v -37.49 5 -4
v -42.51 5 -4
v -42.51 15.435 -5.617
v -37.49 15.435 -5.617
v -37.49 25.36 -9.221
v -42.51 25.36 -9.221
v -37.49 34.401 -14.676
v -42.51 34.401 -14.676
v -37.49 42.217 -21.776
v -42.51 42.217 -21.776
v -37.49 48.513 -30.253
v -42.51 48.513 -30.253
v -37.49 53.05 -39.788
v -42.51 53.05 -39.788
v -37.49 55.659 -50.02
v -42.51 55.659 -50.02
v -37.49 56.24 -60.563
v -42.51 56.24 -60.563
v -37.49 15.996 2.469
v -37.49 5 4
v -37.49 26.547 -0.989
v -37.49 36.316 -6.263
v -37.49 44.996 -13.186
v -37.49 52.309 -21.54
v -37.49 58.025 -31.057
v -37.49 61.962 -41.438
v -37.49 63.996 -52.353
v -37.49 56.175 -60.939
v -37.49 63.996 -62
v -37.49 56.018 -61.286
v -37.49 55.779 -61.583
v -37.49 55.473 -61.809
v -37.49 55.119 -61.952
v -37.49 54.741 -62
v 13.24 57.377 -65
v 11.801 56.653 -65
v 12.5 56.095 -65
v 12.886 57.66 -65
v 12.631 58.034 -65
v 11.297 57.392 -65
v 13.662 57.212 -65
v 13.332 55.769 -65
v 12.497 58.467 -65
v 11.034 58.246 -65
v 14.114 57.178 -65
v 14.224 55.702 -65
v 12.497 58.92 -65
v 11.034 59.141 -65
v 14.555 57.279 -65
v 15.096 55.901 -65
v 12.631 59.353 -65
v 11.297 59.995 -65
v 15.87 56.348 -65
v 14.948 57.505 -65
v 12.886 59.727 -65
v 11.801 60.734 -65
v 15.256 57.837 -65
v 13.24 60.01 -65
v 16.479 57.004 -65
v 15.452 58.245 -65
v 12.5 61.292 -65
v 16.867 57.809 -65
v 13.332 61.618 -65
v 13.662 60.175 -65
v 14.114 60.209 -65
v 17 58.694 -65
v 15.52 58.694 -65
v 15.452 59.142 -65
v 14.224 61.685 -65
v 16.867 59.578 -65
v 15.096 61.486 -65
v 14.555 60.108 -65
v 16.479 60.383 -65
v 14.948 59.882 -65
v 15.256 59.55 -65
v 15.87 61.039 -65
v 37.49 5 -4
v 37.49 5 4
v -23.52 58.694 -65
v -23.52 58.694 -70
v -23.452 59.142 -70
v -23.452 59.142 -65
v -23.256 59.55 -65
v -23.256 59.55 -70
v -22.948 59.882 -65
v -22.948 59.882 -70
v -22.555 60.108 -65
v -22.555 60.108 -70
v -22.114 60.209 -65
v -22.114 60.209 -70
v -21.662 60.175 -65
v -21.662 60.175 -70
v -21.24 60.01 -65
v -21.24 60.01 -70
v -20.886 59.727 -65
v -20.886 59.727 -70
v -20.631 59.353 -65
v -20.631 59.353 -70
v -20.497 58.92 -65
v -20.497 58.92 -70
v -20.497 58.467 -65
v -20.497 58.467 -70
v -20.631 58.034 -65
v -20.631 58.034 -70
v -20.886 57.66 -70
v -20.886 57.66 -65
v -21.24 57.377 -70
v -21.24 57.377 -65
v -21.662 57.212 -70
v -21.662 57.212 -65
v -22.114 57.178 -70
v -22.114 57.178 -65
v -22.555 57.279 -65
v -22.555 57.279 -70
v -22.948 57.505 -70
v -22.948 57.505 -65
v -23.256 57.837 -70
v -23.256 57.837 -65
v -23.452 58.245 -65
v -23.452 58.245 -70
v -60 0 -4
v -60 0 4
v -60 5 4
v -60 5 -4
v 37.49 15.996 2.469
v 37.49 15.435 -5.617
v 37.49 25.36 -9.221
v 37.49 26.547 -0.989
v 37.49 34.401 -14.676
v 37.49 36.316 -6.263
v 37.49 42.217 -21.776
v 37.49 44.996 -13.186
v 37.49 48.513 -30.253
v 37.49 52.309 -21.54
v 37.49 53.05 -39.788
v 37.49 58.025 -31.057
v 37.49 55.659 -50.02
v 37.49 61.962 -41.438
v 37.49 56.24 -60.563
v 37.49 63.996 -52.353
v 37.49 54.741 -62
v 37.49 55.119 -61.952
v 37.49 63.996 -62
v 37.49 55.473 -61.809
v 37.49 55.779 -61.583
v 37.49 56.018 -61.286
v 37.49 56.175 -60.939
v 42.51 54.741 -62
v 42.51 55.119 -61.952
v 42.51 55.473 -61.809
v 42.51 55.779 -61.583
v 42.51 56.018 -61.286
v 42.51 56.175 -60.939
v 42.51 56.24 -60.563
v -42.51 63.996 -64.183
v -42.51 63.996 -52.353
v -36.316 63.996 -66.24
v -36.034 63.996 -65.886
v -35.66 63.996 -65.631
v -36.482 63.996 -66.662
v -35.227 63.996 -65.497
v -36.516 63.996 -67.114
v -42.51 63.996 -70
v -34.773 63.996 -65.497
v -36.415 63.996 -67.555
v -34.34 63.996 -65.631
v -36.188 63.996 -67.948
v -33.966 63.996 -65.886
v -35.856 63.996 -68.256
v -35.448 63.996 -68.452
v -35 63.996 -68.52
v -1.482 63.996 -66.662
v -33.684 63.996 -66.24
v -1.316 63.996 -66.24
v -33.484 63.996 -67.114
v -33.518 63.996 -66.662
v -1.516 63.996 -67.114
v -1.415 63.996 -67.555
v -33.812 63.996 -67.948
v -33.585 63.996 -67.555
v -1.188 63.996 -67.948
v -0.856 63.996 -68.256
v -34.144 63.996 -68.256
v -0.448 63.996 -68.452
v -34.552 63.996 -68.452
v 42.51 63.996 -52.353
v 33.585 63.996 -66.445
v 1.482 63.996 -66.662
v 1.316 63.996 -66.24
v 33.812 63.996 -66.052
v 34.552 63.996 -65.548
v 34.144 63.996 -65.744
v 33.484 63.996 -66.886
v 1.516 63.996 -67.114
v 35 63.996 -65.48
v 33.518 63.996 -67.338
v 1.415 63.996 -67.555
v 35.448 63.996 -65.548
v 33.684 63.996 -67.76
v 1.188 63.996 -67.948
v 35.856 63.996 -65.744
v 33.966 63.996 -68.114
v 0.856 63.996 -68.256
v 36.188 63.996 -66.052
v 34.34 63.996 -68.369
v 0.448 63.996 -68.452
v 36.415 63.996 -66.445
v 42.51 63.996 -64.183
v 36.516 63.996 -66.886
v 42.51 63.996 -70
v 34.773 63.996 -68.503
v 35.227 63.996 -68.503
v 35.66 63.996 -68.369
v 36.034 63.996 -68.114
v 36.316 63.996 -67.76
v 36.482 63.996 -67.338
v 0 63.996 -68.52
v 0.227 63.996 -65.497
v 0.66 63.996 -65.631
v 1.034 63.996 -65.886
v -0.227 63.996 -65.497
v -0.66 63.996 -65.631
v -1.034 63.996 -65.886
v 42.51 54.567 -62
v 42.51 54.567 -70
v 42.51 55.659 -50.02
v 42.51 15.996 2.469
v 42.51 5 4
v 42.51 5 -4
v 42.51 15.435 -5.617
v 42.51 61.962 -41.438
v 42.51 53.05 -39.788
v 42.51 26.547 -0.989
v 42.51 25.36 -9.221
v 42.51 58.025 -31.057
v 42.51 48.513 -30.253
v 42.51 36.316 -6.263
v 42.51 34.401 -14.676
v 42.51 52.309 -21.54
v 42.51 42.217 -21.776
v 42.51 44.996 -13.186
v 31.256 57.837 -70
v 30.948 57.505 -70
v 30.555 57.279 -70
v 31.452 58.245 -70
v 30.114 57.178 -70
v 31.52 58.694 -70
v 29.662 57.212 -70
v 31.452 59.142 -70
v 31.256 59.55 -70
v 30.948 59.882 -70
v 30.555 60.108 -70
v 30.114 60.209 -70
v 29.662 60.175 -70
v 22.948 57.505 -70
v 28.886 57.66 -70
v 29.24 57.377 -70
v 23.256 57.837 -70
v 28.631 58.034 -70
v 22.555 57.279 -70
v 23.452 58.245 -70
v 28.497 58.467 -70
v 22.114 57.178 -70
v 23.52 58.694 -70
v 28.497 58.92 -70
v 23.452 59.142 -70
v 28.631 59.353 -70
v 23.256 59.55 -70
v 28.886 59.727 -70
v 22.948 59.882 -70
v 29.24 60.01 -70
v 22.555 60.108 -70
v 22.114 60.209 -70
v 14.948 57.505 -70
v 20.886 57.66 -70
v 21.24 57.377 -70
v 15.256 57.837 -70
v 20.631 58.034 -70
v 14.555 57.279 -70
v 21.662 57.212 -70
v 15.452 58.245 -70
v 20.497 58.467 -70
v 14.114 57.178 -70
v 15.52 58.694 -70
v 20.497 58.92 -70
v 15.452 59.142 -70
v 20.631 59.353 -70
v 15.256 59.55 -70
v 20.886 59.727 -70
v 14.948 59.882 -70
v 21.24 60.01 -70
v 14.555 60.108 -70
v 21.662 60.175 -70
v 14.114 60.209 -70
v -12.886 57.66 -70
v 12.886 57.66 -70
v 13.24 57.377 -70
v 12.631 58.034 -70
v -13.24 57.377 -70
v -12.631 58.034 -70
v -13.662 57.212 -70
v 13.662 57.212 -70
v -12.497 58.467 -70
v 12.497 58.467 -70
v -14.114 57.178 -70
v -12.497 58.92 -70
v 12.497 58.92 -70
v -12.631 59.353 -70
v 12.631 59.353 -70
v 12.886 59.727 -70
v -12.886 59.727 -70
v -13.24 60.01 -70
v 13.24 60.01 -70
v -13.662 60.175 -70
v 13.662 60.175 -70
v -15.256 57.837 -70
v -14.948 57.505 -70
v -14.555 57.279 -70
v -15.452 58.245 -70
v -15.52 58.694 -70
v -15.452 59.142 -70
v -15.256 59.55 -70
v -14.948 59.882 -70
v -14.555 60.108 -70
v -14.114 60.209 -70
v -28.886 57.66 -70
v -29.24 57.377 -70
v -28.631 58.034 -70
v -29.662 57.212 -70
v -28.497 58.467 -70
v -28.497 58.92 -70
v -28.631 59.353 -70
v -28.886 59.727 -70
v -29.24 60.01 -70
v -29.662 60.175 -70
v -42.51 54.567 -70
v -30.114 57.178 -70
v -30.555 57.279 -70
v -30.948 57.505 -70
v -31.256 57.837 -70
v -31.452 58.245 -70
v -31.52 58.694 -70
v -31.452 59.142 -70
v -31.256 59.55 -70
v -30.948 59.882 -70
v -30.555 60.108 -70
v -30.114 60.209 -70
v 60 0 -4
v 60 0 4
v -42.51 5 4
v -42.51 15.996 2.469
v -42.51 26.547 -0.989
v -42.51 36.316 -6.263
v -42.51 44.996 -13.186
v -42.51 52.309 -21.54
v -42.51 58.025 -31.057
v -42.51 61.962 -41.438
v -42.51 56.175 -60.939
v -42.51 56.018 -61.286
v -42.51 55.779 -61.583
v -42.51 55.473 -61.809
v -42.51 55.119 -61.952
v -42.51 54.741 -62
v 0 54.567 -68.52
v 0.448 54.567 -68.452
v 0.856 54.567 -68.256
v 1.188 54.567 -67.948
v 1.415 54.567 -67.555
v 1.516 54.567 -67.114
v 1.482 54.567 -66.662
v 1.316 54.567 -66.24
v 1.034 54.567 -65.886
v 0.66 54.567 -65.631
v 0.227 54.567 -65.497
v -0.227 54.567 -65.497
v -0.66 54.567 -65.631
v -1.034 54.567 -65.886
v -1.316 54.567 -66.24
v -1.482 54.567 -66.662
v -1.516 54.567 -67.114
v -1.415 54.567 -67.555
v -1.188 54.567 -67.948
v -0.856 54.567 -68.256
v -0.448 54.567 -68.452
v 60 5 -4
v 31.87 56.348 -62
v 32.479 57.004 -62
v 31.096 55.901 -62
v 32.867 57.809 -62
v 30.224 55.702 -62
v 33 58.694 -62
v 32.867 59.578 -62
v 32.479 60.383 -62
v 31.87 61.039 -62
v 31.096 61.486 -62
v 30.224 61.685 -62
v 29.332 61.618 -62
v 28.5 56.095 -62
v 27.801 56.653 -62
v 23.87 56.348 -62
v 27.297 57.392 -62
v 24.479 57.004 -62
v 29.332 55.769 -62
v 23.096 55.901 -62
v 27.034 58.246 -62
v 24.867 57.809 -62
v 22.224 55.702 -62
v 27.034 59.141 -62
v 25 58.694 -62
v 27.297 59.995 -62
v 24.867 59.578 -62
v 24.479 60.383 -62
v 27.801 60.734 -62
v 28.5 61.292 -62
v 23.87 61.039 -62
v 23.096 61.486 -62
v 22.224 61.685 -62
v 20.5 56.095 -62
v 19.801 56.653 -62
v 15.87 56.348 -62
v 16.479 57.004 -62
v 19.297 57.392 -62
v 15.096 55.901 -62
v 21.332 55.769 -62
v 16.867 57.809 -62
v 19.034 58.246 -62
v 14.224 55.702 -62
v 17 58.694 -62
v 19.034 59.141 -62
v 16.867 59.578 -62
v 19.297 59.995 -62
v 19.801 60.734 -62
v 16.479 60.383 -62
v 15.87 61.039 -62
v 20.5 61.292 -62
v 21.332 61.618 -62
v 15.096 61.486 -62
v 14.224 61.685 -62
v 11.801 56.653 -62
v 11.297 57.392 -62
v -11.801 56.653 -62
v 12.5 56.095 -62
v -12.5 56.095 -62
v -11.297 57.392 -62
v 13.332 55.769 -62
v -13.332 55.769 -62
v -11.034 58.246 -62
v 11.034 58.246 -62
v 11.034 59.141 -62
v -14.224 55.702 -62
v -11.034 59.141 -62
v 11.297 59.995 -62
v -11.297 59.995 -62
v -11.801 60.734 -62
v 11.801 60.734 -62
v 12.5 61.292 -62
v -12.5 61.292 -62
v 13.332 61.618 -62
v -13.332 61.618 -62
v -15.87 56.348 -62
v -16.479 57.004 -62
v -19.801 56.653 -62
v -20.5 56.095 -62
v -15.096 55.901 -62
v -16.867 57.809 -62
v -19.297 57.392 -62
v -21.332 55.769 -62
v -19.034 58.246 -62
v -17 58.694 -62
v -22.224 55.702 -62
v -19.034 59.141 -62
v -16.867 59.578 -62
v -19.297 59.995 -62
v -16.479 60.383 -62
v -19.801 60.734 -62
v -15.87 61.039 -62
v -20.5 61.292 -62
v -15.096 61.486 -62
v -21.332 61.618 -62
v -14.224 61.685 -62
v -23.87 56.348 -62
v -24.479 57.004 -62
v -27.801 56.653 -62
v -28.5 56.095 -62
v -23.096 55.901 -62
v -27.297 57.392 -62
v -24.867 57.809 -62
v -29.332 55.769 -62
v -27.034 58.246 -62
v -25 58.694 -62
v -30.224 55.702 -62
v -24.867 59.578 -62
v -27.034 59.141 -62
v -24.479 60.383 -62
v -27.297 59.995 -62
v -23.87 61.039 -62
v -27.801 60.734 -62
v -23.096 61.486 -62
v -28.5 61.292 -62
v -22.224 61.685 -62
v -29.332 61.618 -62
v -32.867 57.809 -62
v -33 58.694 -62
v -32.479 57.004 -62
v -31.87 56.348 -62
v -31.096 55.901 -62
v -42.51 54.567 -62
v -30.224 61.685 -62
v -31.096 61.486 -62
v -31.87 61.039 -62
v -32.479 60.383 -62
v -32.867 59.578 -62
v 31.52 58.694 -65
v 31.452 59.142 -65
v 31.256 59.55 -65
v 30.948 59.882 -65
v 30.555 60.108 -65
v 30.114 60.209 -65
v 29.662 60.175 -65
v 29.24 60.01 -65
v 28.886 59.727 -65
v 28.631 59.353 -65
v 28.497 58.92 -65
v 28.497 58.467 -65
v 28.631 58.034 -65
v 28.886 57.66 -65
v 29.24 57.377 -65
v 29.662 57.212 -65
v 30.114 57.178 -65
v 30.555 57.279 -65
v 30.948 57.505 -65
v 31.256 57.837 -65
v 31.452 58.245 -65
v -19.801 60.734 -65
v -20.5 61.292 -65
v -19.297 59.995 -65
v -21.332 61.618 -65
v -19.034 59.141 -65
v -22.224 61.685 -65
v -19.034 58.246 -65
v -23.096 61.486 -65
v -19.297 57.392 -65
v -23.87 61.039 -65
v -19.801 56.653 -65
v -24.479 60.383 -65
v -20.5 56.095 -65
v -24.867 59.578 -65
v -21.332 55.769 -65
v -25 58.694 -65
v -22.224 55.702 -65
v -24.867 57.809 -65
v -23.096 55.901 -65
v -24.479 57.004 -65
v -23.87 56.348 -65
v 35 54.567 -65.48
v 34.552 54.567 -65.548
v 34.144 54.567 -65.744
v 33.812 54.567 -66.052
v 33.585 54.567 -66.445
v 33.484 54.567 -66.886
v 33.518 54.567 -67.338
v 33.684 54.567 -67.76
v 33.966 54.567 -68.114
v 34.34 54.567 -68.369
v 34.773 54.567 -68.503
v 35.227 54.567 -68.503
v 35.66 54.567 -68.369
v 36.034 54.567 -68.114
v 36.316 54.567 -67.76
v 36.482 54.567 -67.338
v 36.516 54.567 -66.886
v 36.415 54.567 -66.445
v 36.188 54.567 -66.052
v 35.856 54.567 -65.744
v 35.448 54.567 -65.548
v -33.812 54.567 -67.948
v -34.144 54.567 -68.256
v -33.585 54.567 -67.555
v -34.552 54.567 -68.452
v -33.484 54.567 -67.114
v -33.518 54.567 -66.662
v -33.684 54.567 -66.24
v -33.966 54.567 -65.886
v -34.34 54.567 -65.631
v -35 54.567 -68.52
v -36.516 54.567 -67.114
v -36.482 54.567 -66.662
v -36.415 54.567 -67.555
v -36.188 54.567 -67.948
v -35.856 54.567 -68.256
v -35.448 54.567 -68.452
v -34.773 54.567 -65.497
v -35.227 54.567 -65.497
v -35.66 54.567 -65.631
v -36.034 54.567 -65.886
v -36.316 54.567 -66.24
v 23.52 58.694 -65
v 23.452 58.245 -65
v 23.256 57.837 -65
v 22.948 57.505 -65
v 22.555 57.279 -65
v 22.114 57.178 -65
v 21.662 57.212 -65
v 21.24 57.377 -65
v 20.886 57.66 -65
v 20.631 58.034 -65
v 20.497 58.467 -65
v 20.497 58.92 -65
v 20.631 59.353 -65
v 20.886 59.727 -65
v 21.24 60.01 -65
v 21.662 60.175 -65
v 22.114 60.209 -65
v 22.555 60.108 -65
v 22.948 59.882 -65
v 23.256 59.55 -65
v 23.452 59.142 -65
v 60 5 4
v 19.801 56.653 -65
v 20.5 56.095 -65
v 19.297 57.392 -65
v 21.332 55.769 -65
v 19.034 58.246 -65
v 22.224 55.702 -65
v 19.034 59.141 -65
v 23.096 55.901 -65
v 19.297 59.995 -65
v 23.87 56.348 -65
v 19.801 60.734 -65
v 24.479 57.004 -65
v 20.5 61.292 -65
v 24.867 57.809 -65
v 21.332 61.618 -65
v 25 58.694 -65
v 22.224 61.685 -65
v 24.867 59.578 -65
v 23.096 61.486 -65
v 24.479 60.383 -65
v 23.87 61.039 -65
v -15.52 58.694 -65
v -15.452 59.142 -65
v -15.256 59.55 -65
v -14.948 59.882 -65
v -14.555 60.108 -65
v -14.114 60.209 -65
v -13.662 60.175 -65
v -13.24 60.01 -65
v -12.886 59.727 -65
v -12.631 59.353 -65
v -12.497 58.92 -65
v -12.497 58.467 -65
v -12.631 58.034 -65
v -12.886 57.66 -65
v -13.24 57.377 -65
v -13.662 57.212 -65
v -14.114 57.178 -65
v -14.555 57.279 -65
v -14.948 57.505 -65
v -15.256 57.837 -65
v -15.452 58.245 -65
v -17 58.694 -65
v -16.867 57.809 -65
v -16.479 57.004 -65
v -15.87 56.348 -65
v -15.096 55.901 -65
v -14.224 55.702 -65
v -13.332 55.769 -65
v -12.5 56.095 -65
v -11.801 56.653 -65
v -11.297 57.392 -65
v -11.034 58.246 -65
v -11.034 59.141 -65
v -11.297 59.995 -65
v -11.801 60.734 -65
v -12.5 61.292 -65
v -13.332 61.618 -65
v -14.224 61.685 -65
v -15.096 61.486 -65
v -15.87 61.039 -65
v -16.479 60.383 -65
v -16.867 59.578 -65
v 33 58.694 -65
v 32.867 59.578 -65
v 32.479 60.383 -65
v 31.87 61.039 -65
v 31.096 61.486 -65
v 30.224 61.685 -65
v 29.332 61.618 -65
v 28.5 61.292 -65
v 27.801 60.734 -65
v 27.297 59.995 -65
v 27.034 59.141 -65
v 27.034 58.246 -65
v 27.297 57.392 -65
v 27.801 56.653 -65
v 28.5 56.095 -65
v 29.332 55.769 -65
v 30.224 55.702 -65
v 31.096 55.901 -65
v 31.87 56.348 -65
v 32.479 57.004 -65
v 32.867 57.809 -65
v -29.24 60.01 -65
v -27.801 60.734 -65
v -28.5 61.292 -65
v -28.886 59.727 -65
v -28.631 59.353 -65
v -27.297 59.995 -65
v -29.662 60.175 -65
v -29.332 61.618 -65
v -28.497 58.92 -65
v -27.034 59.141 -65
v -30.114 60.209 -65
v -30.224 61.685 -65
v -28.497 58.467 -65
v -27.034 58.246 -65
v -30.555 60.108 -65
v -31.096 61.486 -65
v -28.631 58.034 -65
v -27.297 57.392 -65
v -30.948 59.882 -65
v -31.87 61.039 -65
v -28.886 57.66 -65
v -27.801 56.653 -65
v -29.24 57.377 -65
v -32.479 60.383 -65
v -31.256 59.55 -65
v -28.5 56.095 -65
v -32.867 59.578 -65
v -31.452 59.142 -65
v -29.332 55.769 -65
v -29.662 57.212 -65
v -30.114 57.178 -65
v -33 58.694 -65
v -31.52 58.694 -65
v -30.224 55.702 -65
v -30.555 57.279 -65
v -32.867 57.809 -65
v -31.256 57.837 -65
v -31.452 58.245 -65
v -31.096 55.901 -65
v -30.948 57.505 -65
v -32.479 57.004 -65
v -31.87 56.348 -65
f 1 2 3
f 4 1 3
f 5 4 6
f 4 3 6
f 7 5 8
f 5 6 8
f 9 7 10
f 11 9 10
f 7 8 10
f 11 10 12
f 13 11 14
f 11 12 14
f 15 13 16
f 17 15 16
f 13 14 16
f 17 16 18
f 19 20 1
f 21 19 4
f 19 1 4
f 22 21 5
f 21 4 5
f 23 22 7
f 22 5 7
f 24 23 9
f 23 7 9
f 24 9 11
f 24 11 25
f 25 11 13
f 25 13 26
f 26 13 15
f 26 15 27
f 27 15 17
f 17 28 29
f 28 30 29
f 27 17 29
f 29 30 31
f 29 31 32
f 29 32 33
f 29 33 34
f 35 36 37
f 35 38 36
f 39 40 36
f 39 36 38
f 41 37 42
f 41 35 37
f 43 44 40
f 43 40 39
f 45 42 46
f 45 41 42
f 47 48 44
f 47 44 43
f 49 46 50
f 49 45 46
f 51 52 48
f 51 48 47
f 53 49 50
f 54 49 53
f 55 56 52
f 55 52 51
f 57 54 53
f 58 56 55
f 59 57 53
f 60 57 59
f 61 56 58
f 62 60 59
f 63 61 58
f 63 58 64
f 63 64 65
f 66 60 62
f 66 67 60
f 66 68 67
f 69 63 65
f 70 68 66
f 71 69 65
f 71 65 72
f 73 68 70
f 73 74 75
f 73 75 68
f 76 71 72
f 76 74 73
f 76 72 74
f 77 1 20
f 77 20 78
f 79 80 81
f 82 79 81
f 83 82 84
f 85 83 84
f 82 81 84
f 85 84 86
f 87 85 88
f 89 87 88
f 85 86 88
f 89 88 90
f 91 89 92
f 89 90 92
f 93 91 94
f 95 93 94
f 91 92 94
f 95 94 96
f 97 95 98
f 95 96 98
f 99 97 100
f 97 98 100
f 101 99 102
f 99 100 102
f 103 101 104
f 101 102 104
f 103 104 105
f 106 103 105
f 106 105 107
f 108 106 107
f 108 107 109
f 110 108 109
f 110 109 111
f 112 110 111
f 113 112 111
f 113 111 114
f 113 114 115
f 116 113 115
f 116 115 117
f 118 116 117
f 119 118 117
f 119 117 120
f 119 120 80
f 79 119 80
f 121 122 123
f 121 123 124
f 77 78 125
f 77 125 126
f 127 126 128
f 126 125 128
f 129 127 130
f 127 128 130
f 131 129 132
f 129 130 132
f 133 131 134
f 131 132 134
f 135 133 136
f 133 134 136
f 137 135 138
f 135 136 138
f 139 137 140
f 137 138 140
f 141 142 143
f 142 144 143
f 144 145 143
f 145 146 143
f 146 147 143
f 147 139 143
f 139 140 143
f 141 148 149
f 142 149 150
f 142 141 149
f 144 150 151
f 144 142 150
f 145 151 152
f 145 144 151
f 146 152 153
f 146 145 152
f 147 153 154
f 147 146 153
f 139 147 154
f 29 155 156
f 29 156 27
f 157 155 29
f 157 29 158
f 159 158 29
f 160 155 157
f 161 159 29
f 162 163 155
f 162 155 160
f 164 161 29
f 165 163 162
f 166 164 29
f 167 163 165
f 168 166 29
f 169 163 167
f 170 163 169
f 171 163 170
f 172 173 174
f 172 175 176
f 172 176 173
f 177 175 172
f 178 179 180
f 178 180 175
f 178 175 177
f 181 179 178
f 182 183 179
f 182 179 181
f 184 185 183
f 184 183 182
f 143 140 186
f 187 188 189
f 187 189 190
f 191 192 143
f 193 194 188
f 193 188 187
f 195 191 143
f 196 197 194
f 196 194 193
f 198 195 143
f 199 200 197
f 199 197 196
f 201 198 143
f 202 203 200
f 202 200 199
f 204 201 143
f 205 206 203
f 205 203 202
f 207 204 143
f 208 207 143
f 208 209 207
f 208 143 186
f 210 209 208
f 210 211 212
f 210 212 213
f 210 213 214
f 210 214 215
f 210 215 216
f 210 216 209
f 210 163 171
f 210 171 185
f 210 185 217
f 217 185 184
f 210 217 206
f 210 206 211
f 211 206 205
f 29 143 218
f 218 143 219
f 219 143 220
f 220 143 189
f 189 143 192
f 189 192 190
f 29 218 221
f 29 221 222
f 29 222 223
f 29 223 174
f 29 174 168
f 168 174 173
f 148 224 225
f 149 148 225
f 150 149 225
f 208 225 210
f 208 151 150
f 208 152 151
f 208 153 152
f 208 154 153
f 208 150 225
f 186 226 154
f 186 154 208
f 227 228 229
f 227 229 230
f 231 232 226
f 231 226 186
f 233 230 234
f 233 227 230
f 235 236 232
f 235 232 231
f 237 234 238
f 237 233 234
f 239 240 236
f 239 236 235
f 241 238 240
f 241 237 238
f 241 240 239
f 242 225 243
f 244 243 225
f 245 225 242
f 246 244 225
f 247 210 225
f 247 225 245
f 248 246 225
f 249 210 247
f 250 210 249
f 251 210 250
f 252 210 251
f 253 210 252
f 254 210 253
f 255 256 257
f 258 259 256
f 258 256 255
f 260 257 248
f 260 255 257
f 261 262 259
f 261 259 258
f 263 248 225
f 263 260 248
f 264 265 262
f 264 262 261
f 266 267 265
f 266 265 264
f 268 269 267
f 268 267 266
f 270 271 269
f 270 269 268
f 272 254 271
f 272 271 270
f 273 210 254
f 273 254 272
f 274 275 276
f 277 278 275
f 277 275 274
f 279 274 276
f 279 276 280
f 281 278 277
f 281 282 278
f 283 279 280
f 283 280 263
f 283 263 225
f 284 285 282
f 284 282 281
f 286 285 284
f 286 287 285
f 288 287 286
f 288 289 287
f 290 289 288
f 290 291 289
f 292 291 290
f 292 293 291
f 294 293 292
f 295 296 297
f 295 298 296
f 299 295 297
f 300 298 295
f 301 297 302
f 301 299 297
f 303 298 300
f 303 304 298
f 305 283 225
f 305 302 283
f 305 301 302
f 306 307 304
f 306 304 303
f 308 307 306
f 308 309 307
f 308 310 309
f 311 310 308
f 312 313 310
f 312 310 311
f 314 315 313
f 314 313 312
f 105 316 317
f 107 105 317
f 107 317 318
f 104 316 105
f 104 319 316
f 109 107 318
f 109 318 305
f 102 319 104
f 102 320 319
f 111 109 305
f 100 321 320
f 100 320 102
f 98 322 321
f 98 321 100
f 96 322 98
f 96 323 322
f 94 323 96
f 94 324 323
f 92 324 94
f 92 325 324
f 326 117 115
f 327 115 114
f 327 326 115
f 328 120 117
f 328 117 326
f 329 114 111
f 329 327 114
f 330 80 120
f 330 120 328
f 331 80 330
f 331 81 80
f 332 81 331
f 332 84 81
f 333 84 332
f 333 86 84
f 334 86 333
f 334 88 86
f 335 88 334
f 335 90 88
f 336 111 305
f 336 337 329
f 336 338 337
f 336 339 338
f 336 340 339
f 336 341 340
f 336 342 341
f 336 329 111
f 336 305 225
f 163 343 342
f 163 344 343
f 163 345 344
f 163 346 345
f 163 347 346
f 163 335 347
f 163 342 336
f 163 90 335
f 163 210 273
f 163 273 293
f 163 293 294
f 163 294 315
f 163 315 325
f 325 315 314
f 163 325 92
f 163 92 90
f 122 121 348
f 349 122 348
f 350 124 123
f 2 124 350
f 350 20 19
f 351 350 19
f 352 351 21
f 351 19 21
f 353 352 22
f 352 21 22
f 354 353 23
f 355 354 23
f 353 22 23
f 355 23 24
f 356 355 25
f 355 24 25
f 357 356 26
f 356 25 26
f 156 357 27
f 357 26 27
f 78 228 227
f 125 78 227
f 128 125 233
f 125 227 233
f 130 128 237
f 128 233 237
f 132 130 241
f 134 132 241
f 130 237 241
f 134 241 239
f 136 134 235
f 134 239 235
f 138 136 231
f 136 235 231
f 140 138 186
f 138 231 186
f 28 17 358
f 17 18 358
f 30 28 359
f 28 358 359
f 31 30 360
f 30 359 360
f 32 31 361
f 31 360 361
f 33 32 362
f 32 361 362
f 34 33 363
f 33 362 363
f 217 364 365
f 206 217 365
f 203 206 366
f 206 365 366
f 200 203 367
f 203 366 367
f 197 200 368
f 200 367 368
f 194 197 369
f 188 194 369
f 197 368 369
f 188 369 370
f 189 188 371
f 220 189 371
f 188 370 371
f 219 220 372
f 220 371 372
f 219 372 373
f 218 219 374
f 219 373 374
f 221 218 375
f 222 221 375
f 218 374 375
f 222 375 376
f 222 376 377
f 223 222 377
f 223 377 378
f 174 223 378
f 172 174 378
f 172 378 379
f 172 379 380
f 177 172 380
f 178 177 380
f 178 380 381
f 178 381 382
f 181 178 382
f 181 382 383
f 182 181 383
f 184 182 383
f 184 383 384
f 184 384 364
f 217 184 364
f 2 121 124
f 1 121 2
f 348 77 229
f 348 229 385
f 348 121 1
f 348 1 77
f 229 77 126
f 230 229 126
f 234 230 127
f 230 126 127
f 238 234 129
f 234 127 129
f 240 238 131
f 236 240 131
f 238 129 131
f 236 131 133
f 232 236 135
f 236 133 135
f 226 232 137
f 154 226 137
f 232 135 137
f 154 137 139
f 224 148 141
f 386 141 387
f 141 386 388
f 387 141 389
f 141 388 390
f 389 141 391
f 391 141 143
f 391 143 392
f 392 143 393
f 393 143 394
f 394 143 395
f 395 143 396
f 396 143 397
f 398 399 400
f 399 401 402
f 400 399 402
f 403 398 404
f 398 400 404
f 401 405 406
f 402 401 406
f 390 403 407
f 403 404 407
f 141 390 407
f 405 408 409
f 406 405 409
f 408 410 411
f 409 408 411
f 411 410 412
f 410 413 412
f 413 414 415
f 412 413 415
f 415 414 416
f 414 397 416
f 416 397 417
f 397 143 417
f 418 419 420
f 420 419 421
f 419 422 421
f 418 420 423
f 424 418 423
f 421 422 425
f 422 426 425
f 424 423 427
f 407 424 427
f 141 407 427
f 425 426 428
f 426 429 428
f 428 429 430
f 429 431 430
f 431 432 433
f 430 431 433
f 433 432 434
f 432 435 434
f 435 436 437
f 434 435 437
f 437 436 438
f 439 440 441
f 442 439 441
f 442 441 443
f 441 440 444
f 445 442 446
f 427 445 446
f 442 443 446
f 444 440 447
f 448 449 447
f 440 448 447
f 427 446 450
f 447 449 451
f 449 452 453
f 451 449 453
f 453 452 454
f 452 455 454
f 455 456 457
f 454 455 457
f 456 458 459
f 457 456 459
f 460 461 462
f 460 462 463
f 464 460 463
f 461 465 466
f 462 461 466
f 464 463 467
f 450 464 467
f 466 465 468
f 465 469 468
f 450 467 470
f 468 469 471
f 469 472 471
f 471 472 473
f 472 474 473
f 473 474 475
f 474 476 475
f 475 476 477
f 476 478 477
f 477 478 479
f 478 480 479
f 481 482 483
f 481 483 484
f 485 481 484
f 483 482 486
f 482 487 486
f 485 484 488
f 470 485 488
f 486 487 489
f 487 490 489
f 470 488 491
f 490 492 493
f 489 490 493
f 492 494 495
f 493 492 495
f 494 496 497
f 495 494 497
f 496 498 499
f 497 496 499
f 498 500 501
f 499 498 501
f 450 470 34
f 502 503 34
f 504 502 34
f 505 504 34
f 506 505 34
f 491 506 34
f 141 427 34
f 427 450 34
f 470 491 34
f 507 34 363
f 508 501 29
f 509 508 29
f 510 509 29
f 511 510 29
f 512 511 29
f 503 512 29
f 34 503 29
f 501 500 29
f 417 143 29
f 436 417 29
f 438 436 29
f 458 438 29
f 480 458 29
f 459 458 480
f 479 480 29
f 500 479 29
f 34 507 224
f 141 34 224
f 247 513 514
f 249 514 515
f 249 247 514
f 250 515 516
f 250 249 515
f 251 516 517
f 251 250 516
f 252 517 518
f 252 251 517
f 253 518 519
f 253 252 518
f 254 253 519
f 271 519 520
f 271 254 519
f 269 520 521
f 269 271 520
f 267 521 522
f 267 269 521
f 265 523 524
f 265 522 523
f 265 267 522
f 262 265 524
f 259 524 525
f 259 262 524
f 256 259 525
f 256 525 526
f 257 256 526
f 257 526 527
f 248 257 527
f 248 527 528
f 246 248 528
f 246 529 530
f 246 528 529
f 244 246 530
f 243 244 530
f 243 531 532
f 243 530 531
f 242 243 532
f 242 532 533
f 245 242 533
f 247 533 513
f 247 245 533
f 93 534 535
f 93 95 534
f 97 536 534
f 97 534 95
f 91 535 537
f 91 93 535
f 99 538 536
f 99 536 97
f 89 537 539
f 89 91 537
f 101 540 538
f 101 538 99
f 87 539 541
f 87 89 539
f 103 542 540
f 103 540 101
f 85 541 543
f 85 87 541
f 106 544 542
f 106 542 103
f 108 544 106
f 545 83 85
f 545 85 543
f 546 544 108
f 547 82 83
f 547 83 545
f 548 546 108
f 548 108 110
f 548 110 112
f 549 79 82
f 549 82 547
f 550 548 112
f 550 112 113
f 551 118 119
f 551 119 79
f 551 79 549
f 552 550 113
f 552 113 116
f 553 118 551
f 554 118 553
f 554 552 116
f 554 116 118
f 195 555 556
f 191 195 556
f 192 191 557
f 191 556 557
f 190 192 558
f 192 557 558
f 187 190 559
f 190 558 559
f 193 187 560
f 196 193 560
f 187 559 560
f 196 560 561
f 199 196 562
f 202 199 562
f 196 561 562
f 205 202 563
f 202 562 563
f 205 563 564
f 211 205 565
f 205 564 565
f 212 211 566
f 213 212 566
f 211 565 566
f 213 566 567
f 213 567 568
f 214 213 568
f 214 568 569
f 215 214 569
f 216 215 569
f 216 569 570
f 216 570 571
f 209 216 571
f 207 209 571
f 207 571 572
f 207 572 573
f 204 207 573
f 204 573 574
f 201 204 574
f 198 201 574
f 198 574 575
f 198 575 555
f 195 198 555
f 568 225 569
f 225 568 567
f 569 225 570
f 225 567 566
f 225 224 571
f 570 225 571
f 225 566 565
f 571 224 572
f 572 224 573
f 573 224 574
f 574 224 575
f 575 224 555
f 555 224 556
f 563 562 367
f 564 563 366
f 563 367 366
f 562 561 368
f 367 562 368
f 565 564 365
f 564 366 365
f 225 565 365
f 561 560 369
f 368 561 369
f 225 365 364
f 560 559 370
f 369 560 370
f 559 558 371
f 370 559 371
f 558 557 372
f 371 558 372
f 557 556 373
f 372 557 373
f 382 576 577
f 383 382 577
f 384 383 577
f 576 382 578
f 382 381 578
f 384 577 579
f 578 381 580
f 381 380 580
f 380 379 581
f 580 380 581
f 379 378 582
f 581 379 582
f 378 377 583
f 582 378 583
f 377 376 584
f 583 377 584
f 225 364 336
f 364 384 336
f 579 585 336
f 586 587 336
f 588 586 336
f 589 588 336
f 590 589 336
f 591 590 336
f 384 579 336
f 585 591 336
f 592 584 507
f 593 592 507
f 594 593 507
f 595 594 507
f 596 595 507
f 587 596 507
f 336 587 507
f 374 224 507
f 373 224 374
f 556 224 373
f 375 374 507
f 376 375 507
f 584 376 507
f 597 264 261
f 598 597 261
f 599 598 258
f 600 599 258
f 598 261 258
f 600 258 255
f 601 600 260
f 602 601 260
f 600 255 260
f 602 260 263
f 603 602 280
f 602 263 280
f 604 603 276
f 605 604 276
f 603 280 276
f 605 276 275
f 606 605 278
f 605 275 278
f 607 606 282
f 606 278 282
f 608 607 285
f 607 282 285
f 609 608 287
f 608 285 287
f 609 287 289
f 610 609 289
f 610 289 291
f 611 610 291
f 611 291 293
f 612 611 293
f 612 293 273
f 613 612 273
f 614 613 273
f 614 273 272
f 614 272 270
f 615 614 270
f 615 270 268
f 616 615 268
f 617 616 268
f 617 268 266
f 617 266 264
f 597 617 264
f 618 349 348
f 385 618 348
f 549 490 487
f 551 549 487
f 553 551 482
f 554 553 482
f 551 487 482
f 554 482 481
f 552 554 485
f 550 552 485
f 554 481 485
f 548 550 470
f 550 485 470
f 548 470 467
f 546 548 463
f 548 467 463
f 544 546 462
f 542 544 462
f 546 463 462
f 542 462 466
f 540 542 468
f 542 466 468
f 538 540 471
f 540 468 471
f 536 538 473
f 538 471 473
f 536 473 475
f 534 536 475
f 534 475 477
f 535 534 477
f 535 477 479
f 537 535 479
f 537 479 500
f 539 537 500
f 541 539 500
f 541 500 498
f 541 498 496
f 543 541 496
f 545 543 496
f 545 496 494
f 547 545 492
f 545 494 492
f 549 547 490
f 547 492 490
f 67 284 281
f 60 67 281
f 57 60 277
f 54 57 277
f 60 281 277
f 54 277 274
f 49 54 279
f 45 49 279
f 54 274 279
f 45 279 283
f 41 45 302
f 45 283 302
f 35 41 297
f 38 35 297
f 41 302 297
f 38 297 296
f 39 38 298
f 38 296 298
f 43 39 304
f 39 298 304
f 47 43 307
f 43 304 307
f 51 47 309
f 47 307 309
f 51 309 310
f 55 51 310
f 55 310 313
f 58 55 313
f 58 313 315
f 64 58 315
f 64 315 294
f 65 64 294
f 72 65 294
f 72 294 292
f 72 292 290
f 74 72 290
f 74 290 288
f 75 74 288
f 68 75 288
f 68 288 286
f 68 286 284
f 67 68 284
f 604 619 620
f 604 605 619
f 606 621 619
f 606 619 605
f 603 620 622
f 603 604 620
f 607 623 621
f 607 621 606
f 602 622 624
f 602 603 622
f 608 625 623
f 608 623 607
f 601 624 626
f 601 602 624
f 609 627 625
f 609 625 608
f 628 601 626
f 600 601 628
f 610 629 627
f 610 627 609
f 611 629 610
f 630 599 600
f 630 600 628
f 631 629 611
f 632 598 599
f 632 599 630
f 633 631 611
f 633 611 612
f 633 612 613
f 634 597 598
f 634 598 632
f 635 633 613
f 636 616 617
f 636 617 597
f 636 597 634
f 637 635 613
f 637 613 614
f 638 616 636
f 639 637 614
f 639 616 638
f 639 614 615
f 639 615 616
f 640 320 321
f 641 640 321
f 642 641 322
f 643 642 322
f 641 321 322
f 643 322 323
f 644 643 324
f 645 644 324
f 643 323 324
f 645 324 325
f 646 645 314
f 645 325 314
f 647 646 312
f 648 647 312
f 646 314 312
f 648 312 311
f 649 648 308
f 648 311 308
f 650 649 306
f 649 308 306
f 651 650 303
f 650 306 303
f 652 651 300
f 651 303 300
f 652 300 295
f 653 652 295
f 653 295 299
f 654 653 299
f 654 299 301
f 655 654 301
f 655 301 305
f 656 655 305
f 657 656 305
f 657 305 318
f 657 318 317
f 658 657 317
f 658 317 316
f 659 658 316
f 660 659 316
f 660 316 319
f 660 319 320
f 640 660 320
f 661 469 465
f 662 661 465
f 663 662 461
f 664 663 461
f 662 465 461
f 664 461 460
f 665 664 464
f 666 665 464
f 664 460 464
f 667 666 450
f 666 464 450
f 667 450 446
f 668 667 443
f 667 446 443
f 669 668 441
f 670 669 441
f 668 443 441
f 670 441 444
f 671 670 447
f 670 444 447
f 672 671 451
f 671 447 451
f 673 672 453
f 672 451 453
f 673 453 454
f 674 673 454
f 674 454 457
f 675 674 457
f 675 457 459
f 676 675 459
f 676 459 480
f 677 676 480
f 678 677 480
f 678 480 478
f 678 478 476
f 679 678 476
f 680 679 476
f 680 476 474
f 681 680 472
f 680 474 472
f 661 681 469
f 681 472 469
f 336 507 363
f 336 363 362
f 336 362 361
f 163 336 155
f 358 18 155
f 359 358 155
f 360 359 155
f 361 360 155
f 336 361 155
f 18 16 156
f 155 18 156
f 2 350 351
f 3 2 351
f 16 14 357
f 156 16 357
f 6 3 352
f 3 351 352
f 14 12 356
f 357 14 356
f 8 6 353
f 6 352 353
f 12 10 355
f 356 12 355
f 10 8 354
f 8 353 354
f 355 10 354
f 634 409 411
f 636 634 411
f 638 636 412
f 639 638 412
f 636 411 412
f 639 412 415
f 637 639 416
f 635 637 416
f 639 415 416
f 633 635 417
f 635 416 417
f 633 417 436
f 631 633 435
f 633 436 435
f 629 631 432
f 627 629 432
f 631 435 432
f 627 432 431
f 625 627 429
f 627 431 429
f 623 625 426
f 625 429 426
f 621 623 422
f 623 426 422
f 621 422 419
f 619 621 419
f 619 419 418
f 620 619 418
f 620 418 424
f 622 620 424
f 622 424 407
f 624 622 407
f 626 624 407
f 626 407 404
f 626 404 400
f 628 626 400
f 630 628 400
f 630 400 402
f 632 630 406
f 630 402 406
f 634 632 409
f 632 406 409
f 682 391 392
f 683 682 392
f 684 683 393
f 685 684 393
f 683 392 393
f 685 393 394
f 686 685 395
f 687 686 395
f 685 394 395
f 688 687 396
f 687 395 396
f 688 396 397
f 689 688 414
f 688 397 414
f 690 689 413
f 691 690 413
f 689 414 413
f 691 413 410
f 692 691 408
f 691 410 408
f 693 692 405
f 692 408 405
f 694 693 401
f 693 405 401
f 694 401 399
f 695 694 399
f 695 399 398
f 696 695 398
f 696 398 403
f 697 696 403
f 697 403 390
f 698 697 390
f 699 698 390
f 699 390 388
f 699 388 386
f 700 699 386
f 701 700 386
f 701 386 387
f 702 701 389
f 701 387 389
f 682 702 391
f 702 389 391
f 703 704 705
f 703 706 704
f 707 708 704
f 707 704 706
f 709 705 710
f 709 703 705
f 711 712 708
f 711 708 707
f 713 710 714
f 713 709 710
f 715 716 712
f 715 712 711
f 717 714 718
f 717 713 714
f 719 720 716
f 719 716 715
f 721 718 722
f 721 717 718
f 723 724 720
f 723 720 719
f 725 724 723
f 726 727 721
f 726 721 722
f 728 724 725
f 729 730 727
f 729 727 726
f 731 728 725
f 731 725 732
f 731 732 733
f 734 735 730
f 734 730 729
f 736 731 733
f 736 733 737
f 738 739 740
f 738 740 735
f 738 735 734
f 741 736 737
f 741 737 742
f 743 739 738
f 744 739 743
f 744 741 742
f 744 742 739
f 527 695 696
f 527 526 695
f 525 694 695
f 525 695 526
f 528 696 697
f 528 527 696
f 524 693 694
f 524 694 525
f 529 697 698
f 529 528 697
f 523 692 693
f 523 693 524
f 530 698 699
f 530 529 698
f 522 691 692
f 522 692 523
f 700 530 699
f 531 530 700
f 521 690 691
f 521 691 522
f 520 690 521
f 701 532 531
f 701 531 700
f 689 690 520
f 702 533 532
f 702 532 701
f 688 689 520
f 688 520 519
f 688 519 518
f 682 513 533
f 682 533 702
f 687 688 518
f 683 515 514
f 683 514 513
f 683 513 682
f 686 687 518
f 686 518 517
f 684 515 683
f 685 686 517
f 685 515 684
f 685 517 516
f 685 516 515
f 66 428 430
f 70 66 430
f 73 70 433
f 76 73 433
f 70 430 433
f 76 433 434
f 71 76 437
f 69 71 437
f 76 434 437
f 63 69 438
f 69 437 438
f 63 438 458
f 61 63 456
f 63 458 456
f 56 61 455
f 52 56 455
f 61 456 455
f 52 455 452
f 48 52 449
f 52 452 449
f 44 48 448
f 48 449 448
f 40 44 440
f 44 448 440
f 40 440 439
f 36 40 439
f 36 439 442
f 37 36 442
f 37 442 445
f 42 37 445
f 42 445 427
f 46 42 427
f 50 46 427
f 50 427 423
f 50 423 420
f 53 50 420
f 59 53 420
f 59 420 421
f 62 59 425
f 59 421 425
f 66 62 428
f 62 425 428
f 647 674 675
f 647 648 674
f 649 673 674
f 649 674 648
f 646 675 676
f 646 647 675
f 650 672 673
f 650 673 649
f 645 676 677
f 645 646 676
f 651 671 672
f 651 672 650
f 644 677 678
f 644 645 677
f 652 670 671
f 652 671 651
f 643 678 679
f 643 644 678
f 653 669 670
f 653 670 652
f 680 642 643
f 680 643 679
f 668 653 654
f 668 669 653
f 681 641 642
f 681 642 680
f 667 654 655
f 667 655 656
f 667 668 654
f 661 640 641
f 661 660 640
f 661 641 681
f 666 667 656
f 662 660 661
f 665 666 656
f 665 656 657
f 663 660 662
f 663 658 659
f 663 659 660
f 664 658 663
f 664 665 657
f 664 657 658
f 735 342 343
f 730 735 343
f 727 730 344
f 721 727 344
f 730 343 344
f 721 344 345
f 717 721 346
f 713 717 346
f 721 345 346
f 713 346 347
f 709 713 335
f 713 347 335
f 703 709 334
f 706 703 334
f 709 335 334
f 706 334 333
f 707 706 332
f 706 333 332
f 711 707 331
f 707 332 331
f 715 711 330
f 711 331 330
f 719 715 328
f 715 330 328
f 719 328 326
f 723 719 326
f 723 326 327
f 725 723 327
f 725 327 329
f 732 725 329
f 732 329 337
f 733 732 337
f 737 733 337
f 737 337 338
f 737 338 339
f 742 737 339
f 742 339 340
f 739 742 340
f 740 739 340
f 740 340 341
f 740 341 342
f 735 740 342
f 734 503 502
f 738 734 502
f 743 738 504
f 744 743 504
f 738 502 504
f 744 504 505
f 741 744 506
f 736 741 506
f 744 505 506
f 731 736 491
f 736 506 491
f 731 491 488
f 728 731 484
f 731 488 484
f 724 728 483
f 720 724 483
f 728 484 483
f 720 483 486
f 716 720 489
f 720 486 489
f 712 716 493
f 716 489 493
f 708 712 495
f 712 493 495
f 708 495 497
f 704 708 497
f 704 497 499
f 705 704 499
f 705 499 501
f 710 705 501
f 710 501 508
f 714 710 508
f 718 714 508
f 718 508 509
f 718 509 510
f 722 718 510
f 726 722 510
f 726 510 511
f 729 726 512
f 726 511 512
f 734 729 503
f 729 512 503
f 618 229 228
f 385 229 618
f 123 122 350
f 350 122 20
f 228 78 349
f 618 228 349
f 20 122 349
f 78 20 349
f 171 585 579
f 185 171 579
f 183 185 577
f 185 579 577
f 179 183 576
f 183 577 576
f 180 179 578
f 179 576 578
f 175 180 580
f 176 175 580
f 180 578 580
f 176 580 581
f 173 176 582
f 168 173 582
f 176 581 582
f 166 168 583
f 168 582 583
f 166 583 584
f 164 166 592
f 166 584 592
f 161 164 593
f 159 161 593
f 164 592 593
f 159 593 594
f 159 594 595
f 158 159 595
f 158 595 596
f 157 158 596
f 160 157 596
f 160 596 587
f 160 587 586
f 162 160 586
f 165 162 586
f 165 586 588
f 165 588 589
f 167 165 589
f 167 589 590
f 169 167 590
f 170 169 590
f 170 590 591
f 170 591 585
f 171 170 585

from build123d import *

# Parameters (mm, degrees)
SKETCH_1_W               = 120
SKETCH_1_H               = 8
EXTRUDE_1_DEPTH          = 5
SKETCH_2_W               = 5.019384612
SKETCH_2_H               = 8
PATTERN_LINEAR_2_COUNT   = 2
PATTERN_LINEAR_2_PITCH   = 80
EXTRUDE_3_DEPTH          = 6
EXTRUDE_3_DEPTH_BACK     = 2
SKETCH_5_W               = 85.019384612
SKETCH_5_H               = 9.428556335
SKETCH_6_R               = 1.52
CUT_EXTRUDE_1_DEPTH      = 18
PATTERN_LINEAR_3_COUNT   = 3
PATTERN_LINEAR_3_PITCH   = 8
MIRROR_1_COPY_1_SKETCH_R = 1.52
MIRROR_1_COPY_1_DEPTH    = 18
MIRROR_1_COPY_2_SKETCH_R = 1.52
MIRROR_1_COPY_2_DEPTH    = 18
SKETCH_7_R               = 1.52
CUT_EXTRUDE_2_DEPTH      = 15
SKETCH_8_W               = 136.689726825
SKETCH_8_H               = 40.838827277
CUT_EXTRUDE_3_DEPTH      = 8
SKETCH_10_R              = 3
CUT_EXTRUDE_5_DEPTH      = 3
FILLET_1_R               = 1.5
FILLET_2_R               = 1.5


with BuildPart() as part:
    # 草图1 → 凸台-拉伸1 (new body)
    with BuildSketch(Plane(origin=(0, 0, 0), x_dir=(1, 0, 0), z_dir=(0, 1, 0))):
        Rectangle(SKETCH_1_W, SKETCH_1_H)
    extrude(amount=EXTRUDE_1_DEPTH)

    # 扫描2: sweep along a curve in space
    with BuildLine() as sweep_2_path:
        ThreePointArc((-40, 5, 0), (-40, 46.186296303, -20.238339114), (-40, 60, -64))
    # 草图2 → 扫描2 (sweep)
    with BuildSketch(Plane(origin=(0, 5, 0), x_dir=(1, 0, 0), z_dir=(0, 1, 0))):
        with Locations((-40, 0)):
            Rectangle(SKETCH_2_W, SKETCH_2_H)
    sweep_2 = sweep(path=sweep_2_path.line)

    # 阵列(线性)2: 扫描2 ×2
    with Locations(*[(i * PATTERN_LINEAR_2_PITCH, 0, 0) for i in range(1, PATTERN_LINEAR_2_COUNT)]):
        add(sweep_2)

    # 草图5 → 凸台-拉伸3 (add, two sides: drawn at the far end of the back side and taken through both)
    with BuildSketch(Plane(origin=(0, 0, -64), x_dir=(-1, 0, 0), z_dir=(0, 0, -1)).offset(-EXTRUDE_3_DEPTH_BACK)):
        with Locations((0, 59.281524703)):
            Rectangle(SKETCH_5_W, SKETCH_5_H)
    extrude(amount=EXTRUDE_3_DEPTH + EXTRUDE_3_DEPTH_BACK)

    # 草图6 → 切除-拉伸1 (cut)
    with BuildSketch(Plane(origin=(0, 0, -70), x_dir=(-1, 0, 0), z_dir=(0, 0, -1))):
        with Locations((30, 58.693516137)):
            Circle(SKETCH_6_R)
    cut_extrude_1 = extrude(amount=-CUT_EXTRUDE_1_DEPTH, mode=Mode.SUBTRACT)

    # 阵列(线性)3: 切除-拉伸1 ×3
    with Locations(*[(i * PATTERN_LINEAR_3_PITCH, 0, 0) for i in range(1, PATTERN_LINEAR_3_COUNT)]):
        add(cut_extrude_1, mode=Mode.SUBTRACT)

    # 镜向1: 切除-拉伸1 across plane
    add(cut_extrude_1.mirror(Plane(origin=(0, 0, 0), x_dir=(0, 0, 1), z_dir=(1, 0, 0))), mode=Mode.SUBTRACT)

    # 镜向1 copy 1 sketch → 镜向1 copy 1 (cut)
    with BuildSketch(Plane(origin=(-8, 0, -70), x_dir=(1, 0, 0), z_dir=(0, 0, -1))):
        with Locations((30, -58.693516137)):
            Circle(MIRROR_1_COPY_1_SKETCH_R)
    extrude(amount=-MIRROR_1_COPY_1_DEPTH, mode=Mode.SUBTRACT)

    # 镜向1 copy 2 sketch → 镜向1 copy 2 (cut)
    with BuildSketch(Plane(origin=(-16, 0, -70), x_dir=(1, 0, 0), z_dir=(0, 0, -1))):
        with Locations((30, -58.693516137)):
            Circle(MIRROR_1_COPY_2_SKETCH_R)
    extrude(amount=-MIRROR_1_COPY_2_DEPTH, mode=Mode.SUBTRACT)

    # 草图7 → 切除-拉伸2 (cut)
    with BuildSketch(Plane(origin=(0, 54.567246535, 0), x_dir=(-1, 0, 0), z_dir=(0, -1, 0))):
        with Locations(Location((0, 67, 0), (0, 0, 90))):
            Circle(SKETCH_7_R)
        with Locations(Location((35, 67, 0), (0, 0, 90))):
            Circle(SKETCH_7_R)
        with Locations(Location((-35, 67, 0), (0, 0, 270))):
            Circle(SKETCH_7_R)
    extrude(amount=-CUT_EXTRUDE_2_DEPTH, mode=Mode.SUBTRACT)

    # 草图8 → 切除-拉伸3 (cut)
    with BuildSketch(Plane(origin=(0, 63.99580287, 0), x_dir=(1, 0, 0), z_dir=(0, 1, 0))):
        with Locations((2.188010226, 52.474472022)):
            Rectangle(SKETCH_8_W, SKETCH_8_H)
    extrude(amount=CUT_EXTRUDE_3_DEPTH, mode=Mode.SUBTRACT)

    # 草图10 → 切除-拉伸5 (cut)
    with BuildSketch(Plane.XY.offset(-62)):
        with Locations((30, 58.693516137)):
            Circle(SKETCH_10_R)
        with Locations((22, 58.693516137)):
            Circle(SKETCH_10_R)
        with Locations((14, 58.693516137)):
            Circle(SKETCH_10_R)
        with Locations(Location((-30, 58.693516137, 0), (0, 0, 180))):
            Circle(SKETCH_10_R)
        with Locations(Location((-22, 58.693516137, 0), (0, 0, 180))):
            Circle(SKETCH_10_R)
        with Locations(Location((-14, 58.693516137, 0), (0, 0, 180))):
            Circle(SKETCH_10_R)
    extrude(amount=-CUT_EXTRUDE_5_DEPTH, mode=Mode.SUBTRACT)

    # 圆角1
    fillet_1_edges = [part.edges().sort_by_distance(p)[0] for p in [
        (40, 56.159889336, -62),
    ]]
    fillet(fillet_1_edges, radius=FILLET_1_R)

    # 圆角2
    fillet_2_edges = [part.edges().sort_by_distance(p)[0] for p in [
        (-40, 56.159889336, -62),
    ]]
    fillet(fillet_2_edges, radius=FILLET_2_R)


solid = part.part
